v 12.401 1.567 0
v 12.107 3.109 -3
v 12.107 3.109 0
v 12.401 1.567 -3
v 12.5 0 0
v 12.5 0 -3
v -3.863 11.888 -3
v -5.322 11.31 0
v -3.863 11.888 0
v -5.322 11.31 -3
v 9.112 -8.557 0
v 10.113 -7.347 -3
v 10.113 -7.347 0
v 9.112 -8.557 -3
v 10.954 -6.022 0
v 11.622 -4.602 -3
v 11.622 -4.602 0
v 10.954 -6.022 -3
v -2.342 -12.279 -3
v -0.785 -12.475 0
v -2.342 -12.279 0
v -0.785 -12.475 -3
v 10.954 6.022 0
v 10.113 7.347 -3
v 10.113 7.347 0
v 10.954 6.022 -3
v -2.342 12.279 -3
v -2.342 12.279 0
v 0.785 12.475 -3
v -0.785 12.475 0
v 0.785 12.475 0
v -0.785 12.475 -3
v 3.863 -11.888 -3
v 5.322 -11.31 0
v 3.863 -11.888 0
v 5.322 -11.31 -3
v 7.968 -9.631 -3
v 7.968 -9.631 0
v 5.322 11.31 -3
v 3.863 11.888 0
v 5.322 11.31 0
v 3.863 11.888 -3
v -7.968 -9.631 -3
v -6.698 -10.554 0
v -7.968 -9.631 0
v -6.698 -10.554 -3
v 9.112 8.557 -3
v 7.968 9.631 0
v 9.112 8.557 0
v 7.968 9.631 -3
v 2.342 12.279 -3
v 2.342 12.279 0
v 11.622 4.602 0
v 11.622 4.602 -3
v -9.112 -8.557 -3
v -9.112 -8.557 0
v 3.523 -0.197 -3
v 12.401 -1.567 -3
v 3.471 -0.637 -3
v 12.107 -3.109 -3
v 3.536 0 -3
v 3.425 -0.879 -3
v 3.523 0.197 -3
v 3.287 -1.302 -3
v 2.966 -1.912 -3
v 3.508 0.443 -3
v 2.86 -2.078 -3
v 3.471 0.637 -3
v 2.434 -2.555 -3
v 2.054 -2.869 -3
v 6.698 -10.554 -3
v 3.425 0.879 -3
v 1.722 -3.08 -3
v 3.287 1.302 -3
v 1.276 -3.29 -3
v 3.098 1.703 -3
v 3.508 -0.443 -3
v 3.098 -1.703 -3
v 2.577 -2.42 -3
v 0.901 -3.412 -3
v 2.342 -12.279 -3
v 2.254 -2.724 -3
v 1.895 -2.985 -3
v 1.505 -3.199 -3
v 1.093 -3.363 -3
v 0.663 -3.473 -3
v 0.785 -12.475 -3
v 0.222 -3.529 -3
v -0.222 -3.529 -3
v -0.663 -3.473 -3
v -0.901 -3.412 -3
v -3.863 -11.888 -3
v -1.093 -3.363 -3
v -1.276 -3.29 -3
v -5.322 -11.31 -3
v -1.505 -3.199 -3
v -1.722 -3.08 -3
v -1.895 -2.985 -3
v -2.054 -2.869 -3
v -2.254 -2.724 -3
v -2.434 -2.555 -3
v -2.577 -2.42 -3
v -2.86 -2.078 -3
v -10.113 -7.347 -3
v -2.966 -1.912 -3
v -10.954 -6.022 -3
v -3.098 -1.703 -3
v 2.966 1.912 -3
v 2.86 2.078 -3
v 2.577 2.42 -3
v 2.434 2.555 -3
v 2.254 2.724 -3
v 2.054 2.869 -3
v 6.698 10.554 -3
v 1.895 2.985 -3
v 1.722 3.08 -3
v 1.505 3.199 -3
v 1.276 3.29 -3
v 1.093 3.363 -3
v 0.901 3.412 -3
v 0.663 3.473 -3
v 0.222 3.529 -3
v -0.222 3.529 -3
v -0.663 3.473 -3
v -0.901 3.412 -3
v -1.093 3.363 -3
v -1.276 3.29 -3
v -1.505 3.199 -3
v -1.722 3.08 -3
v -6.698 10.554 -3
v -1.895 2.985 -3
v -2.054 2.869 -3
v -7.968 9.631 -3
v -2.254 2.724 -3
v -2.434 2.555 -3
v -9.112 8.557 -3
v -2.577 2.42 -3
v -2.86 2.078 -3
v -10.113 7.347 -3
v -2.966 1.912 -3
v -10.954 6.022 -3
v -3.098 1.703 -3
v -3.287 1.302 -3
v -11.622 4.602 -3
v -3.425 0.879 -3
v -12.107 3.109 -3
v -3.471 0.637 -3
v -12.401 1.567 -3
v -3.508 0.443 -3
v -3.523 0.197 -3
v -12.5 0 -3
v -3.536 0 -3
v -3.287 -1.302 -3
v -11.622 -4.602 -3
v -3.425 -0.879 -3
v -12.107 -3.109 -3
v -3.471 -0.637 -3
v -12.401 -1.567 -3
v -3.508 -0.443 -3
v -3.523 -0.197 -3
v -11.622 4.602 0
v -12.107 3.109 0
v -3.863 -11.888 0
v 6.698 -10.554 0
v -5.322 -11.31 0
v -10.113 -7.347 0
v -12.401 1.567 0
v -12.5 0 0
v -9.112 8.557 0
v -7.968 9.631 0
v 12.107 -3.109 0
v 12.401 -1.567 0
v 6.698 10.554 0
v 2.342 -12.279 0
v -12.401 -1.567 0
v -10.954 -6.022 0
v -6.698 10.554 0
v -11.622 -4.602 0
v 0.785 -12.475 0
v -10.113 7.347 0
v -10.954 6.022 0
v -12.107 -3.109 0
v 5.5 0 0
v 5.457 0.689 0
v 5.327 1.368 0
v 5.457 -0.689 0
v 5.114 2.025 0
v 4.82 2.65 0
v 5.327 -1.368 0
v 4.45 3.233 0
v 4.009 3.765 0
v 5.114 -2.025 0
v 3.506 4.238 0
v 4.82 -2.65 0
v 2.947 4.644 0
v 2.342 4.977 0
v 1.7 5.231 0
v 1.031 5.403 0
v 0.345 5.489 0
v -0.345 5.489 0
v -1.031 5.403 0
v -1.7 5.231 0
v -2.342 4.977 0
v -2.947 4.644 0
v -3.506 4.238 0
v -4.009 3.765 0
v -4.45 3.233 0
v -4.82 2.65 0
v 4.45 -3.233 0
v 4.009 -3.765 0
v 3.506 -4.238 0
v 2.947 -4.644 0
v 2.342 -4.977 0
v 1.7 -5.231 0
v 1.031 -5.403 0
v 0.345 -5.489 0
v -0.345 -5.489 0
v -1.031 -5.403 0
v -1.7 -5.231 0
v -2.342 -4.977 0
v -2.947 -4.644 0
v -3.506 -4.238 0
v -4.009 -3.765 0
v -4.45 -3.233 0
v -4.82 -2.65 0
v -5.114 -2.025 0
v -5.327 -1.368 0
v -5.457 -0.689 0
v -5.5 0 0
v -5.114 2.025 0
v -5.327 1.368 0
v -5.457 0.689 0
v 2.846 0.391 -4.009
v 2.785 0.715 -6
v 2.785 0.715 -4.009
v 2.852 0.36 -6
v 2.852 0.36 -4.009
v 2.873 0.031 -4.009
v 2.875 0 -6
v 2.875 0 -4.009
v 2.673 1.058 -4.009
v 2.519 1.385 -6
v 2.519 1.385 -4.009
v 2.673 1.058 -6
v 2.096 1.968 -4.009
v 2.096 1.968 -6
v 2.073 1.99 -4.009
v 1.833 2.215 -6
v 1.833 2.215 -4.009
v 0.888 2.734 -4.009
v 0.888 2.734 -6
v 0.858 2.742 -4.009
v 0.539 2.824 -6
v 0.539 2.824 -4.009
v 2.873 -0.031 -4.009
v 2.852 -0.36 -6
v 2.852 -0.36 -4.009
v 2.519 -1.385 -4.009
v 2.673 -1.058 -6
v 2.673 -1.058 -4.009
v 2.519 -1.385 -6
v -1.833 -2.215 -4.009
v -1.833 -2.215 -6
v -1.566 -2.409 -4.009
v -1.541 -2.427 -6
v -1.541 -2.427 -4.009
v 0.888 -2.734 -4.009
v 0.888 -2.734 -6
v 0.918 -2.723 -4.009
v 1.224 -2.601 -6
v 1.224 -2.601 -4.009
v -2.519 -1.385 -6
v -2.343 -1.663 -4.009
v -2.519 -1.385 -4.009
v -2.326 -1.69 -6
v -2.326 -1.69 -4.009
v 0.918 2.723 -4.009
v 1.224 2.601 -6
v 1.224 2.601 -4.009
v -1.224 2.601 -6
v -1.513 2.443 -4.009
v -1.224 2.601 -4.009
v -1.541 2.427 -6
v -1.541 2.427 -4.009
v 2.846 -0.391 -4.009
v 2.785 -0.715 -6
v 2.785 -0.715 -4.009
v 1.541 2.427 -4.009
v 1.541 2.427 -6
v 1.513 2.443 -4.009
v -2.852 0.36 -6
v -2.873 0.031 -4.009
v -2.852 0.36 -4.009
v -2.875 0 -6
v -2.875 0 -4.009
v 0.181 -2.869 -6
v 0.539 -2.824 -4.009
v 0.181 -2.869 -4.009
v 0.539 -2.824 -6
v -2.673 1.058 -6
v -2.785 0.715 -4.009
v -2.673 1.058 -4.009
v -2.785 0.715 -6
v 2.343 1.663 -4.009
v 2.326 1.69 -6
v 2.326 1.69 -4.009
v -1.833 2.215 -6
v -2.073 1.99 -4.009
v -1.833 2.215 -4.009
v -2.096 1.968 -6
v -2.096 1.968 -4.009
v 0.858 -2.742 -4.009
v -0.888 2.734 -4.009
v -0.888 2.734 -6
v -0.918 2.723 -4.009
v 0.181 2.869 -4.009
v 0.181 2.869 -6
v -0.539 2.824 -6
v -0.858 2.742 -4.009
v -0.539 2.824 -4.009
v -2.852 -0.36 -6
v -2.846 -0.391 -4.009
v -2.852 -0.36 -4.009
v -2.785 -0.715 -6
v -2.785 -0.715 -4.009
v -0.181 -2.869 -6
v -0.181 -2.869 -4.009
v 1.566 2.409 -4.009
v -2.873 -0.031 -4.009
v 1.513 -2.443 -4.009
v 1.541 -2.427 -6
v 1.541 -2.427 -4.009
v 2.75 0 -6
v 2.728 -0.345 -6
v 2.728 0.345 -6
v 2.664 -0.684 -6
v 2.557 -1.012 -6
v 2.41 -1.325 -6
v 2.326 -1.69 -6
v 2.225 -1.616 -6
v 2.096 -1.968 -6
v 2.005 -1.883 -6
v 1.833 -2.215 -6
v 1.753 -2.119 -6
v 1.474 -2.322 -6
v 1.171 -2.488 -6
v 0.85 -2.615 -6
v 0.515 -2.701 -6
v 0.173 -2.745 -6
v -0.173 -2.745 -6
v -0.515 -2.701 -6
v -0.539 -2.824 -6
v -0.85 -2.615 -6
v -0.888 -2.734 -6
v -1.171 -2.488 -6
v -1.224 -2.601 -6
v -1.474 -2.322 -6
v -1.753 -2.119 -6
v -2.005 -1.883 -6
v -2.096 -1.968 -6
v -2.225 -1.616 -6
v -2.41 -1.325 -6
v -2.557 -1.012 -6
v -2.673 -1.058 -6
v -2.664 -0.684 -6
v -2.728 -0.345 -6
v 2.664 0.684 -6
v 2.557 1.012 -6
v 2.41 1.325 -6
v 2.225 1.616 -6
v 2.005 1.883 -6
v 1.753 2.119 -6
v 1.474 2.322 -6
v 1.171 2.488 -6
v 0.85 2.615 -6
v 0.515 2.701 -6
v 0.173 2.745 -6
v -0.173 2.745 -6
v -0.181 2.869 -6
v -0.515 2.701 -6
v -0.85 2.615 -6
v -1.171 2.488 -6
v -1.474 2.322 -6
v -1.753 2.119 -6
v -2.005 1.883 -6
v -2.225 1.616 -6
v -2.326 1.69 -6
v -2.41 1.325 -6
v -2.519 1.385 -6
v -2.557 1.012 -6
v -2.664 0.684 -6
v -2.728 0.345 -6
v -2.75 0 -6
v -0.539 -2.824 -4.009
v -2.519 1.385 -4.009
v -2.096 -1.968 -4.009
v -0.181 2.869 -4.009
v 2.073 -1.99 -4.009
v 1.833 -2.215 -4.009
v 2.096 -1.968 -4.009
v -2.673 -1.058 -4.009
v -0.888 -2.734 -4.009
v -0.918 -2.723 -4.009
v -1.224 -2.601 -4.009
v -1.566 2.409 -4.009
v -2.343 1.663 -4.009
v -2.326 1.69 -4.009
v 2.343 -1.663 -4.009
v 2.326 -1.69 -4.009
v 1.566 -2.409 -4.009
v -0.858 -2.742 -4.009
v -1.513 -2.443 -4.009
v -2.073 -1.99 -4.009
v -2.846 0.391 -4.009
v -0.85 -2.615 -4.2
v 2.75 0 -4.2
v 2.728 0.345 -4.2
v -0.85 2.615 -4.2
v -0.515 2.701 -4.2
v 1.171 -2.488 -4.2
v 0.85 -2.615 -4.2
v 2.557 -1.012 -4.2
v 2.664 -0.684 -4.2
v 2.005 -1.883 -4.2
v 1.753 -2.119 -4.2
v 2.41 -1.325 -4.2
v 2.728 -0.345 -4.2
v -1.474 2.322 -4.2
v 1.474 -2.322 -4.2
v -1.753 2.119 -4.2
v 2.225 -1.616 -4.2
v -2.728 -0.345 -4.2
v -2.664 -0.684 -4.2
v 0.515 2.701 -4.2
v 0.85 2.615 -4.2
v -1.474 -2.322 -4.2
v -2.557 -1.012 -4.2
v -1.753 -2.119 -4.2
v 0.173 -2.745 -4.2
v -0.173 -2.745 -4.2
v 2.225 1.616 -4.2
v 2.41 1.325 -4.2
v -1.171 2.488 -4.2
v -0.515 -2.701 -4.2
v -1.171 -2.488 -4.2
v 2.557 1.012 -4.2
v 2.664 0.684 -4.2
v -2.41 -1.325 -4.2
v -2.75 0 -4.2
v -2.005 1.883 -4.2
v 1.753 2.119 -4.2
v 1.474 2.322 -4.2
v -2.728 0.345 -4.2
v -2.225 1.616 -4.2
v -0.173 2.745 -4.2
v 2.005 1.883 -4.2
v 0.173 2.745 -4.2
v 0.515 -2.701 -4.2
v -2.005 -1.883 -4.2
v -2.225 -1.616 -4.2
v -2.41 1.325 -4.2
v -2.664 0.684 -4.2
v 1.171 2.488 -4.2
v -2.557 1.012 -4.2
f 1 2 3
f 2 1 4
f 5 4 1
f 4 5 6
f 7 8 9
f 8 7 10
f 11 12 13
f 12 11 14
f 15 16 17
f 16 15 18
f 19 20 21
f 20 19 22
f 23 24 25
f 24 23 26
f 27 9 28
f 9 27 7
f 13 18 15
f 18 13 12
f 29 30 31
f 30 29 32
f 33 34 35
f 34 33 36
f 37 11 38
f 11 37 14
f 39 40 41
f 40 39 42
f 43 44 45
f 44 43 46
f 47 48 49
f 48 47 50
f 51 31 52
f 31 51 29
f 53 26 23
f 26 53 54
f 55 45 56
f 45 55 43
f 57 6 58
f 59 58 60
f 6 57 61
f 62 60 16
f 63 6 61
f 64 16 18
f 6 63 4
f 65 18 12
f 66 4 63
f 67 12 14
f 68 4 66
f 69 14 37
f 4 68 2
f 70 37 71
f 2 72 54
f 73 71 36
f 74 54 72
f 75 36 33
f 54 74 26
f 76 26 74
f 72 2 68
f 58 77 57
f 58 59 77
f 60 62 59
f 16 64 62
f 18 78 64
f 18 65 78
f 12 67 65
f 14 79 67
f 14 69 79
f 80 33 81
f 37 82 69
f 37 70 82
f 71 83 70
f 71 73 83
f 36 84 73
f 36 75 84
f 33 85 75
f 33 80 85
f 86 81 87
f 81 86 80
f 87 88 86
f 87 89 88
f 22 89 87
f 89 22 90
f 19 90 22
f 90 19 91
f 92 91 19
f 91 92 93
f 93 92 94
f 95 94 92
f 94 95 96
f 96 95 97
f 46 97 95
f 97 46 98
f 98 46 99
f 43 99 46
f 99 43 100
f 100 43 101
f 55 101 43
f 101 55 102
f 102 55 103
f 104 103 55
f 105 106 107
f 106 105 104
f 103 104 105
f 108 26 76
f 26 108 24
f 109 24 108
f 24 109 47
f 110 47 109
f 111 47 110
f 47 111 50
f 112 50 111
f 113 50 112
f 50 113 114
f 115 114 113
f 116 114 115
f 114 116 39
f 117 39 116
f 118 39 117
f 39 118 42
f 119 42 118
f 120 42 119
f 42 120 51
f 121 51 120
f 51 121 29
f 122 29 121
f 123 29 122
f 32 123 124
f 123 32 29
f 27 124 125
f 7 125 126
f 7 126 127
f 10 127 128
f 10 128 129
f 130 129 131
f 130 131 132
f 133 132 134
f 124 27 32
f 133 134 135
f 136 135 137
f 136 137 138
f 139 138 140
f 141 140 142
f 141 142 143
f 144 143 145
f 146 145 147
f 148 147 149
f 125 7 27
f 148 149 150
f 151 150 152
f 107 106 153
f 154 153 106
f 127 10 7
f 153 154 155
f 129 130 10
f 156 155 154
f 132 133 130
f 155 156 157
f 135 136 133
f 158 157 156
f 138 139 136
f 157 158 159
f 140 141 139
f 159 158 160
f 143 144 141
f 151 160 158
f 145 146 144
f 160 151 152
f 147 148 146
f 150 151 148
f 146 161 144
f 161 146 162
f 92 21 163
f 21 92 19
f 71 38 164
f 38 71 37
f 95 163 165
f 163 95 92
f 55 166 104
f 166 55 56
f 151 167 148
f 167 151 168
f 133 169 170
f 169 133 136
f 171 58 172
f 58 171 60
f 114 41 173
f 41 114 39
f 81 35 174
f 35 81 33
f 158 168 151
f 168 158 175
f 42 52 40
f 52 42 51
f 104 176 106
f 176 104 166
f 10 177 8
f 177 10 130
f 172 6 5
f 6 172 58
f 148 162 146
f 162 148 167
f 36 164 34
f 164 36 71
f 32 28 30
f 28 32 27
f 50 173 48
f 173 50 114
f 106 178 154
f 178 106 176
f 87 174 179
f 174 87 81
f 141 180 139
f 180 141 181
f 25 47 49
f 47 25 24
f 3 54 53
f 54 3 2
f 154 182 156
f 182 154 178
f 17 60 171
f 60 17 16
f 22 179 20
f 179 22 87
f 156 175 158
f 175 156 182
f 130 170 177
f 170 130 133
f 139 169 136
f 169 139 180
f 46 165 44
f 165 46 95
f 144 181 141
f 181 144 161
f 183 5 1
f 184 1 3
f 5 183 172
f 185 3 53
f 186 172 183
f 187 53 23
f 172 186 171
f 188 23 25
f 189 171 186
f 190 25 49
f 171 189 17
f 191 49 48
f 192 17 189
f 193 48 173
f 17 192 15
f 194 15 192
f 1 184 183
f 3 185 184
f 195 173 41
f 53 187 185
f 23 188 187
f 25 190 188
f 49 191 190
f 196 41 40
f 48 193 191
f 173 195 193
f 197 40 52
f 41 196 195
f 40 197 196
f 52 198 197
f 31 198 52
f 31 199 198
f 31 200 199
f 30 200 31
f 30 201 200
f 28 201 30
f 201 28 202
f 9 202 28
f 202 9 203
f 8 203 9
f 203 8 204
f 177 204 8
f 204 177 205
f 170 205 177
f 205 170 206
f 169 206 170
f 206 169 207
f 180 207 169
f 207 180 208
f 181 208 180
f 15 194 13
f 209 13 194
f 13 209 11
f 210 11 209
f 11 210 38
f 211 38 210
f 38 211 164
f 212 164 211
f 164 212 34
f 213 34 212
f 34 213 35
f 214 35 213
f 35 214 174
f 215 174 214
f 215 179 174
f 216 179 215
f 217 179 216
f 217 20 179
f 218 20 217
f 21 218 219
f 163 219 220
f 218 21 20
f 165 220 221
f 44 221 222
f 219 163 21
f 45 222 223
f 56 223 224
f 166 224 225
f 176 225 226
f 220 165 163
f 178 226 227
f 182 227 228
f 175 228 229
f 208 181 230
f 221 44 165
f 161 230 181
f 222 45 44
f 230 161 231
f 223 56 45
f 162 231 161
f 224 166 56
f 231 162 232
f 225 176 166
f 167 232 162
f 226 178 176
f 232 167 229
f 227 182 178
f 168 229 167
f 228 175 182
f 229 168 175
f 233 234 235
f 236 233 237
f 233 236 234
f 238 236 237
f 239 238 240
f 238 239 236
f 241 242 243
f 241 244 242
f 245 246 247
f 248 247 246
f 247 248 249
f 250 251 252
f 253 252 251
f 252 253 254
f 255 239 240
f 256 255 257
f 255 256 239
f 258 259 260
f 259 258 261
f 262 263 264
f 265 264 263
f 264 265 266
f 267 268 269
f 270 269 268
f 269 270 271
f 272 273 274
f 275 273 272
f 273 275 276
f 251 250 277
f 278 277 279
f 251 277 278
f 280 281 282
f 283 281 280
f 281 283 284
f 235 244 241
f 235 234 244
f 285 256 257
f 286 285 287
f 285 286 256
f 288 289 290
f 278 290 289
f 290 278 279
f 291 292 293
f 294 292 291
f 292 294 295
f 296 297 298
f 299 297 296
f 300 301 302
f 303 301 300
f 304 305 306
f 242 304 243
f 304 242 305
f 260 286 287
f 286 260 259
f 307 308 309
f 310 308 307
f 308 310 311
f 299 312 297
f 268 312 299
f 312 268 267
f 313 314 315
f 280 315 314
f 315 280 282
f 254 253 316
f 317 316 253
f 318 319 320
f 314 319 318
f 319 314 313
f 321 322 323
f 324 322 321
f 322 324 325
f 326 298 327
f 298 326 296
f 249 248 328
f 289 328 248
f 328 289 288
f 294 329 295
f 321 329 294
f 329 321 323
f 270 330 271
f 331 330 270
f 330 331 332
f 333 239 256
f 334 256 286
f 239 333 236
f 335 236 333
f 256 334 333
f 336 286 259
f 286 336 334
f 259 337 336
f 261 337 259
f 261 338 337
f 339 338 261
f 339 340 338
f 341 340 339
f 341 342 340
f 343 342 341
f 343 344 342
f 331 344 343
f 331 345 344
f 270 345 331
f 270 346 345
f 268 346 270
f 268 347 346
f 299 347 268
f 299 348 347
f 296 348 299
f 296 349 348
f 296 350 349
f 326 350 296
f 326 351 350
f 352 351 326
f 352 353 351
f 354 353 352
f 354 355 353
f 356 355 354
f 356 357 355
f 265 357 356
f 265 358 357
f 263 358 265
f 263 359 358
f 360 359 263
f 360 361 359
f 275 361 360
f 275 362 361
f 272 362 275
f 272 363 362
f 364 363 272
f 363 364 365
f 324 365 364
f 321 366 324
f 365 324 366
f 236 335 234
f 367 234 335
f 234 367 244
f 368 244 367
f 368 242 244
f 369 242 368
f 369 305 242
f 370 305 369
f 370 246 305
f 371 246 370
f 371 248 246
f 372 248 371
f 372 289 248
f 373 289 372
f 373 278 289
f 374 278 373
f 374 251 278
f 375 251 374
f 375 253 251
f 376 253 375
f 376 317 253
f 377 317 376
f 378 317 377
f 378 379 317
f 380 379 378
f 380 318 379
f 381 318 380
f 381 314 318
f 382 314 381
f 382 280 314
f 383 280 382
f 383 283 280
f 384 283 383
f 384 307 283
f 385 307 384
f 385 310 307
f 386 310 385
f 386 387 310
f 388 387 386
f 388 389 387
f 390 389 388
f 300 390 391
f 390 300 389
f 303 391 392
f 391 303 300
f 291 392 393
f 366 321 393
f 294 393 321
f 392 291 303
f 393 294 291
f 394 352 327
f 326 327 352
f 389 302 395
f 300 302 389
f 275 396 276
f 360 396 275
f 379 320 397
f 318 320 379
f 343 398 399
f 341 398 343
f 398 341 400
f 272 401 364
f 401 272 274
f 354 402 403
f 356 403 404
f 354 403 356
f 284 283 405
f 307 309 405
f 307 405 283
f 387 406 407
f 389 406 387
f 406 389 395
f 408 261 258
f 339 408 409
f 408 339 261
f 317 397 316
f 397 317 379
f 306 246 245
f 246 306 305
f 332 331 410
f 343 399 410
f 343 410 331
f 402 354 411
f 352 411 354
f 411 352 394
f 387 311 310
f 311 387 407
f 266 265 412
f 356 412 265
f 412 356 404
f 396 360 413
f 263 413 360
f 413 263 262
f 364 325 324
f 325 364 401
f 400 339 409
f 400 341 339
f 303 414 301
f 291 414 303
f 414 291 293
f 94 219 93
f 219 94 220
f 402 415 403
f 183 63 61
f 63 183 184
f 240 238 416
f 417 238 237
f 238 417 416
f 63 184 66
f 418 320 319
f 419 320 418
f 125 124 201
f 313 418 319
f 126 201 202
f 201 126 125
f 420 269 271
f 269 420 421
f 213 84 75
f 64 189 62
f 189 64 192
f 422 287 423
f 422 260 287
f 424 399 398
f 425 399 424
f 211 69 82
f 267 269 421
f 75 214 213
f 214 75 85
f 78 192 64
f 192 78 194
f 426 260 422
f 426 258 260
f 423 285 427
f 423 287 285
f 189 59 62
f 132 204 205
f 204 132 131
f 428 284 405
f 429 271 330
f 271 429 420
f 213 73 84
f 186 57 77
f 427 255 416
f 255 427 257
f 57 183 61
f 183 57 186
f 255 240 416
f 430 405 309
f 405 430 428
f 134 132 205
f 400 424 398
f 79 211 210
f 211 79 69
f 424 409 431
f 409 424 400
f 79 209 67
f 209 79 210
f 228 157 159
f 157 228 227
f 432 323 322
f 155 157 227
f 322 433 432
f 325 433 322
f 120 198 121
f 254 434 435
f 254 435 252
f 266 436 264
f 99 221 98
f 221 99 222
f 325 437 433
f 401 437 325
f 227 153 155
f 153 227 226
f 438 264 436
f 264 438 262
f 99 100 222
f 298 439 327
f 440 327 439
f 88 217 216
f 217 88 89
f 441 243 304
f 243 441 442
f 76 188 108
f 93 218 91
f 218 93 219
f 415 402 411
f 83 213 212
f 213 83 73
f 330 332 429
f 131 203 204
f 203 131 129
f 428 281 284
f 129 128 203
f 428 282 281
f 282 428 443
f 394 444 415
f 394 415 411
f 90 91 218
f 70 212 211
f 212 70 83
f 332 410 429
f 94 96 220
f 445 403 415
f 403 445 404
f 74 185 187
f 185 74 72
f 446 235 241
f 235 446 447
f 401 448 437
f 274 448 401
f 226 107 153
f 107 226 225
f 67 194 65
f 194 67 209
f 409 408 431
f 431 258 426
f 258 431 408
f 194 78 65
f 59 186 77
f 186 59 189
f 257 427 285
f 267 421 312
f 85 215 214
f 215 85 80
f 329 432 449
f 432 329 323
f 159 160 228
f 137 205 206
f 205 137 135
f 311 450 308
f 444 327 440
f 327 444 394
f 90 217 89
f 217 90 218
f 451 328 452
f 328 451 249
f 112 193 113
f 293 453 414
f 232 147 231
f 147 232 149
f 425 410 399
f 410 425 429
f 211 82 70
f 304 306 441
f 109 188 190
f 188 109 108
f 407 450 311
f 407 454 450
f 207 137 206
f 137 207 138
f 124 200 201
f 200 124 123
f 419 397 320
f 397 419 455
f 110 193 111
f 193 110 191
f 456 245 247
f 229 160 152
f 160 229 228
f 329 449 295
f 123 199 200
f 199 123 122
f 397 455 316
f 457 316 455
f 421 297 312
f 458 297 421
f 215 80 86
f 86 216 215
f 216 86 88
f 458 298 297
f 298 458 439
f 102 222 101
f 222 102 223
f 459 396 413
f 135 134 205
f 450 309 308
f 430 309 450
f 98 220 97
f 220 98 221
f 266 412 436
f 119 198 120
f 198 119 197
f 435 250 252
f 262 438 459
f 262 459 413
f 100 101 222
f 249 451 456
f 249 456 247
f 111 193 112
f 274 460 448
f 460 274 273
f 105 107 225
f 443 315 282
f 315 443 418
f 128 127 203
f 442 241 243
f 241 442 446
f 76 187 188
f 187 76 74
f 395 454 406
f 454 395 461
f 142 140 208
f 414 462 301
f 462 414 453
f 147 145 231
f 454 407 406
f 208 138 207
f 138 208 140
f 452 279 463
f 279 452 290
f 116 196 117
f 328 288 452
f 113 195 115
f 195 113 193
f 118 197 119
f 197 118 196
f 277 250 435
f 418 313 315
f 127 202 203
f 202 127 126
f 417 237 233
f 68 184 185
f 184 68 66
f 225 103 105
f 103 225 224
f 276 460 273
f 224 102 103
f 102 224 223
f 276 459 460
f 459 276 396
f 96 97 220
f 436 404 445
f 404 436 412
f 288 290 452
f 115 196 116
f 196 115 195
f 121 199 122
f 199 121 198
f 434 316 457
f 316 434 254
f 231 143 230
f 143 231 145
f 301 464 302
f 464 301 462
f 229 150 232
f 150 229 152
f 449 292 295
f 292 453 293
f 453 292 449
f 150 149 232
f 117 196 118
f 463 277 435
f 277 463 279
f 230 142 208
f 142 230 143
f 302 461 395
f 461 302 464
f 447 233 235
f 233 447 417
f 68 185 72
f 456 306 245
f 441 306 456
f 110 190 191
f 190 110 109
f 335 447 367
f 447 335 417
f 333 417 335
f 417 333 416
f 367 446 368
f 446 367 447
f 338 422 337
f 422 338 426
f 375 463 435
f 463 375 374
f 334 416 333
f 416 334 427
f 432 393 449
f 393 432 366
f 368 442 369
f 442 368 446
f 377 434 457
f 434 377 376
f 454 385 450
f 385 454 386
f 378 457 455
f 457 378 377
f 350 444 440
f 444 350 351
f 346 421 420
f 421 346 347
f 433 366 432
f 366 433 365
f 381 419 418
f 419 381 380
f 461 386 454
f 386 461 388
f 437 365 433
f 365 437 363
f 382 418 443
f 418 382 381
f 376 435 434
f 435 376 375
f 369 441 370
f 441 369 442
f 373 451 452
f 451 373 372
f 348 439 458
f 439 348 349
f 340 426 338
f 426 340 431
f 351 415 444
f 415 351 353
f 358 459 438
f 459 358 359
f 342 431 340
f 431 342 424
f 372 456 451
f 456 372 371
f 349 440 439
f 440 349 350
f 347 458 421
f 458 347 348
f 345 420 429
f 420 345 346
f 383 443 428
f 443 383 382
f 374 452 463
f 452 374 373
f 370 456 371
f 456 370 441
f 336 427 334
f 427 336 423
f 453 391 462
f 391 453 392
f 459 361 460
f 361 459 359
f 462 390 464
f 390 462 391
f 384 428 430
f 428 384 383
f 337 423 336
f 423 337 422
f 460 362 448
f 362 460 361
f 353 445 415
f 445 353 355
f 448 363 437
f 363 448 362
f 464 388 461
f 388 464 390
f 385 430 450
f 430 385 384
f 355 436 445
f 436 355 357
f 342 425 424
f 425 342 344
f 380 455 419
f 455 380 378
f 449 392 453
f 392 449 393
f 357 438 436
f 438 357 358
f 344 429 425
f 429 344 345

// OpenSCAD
$fn = 50;

difference() {
	union() {
		translate(v = [0, 0, -3.0]) {
			cylinder(h = 3, r = 12.5);
		}
		#translate(v = [0, 0, -6.0]) {
			cylinder(h = 6, r = 2.875);
		}
	}
	union() {
		translate(v = [0, 0, 0]) {
			rotate(a = [0, 0, 0]) {
				difference() {
					union() {
						translate(v = [0, 0, -6.0]) {
							cylinder(h = 6, r = 2.25);
						}
						translate(v = [0, 0, -4.2]) {
							cylinder(h = 4.2, r1 = 2.75, r2 = 5.5);
						}
						translate(v = [0, 0, -6.0]) {
							cylinder(h = 6, r = 2.75);
						}
						translate(v = [0, 0, -6.0]) {
							cylinder(h = 6, r = 2.25);
						}
					}
					union();
				}
			}
		}
	}
}
